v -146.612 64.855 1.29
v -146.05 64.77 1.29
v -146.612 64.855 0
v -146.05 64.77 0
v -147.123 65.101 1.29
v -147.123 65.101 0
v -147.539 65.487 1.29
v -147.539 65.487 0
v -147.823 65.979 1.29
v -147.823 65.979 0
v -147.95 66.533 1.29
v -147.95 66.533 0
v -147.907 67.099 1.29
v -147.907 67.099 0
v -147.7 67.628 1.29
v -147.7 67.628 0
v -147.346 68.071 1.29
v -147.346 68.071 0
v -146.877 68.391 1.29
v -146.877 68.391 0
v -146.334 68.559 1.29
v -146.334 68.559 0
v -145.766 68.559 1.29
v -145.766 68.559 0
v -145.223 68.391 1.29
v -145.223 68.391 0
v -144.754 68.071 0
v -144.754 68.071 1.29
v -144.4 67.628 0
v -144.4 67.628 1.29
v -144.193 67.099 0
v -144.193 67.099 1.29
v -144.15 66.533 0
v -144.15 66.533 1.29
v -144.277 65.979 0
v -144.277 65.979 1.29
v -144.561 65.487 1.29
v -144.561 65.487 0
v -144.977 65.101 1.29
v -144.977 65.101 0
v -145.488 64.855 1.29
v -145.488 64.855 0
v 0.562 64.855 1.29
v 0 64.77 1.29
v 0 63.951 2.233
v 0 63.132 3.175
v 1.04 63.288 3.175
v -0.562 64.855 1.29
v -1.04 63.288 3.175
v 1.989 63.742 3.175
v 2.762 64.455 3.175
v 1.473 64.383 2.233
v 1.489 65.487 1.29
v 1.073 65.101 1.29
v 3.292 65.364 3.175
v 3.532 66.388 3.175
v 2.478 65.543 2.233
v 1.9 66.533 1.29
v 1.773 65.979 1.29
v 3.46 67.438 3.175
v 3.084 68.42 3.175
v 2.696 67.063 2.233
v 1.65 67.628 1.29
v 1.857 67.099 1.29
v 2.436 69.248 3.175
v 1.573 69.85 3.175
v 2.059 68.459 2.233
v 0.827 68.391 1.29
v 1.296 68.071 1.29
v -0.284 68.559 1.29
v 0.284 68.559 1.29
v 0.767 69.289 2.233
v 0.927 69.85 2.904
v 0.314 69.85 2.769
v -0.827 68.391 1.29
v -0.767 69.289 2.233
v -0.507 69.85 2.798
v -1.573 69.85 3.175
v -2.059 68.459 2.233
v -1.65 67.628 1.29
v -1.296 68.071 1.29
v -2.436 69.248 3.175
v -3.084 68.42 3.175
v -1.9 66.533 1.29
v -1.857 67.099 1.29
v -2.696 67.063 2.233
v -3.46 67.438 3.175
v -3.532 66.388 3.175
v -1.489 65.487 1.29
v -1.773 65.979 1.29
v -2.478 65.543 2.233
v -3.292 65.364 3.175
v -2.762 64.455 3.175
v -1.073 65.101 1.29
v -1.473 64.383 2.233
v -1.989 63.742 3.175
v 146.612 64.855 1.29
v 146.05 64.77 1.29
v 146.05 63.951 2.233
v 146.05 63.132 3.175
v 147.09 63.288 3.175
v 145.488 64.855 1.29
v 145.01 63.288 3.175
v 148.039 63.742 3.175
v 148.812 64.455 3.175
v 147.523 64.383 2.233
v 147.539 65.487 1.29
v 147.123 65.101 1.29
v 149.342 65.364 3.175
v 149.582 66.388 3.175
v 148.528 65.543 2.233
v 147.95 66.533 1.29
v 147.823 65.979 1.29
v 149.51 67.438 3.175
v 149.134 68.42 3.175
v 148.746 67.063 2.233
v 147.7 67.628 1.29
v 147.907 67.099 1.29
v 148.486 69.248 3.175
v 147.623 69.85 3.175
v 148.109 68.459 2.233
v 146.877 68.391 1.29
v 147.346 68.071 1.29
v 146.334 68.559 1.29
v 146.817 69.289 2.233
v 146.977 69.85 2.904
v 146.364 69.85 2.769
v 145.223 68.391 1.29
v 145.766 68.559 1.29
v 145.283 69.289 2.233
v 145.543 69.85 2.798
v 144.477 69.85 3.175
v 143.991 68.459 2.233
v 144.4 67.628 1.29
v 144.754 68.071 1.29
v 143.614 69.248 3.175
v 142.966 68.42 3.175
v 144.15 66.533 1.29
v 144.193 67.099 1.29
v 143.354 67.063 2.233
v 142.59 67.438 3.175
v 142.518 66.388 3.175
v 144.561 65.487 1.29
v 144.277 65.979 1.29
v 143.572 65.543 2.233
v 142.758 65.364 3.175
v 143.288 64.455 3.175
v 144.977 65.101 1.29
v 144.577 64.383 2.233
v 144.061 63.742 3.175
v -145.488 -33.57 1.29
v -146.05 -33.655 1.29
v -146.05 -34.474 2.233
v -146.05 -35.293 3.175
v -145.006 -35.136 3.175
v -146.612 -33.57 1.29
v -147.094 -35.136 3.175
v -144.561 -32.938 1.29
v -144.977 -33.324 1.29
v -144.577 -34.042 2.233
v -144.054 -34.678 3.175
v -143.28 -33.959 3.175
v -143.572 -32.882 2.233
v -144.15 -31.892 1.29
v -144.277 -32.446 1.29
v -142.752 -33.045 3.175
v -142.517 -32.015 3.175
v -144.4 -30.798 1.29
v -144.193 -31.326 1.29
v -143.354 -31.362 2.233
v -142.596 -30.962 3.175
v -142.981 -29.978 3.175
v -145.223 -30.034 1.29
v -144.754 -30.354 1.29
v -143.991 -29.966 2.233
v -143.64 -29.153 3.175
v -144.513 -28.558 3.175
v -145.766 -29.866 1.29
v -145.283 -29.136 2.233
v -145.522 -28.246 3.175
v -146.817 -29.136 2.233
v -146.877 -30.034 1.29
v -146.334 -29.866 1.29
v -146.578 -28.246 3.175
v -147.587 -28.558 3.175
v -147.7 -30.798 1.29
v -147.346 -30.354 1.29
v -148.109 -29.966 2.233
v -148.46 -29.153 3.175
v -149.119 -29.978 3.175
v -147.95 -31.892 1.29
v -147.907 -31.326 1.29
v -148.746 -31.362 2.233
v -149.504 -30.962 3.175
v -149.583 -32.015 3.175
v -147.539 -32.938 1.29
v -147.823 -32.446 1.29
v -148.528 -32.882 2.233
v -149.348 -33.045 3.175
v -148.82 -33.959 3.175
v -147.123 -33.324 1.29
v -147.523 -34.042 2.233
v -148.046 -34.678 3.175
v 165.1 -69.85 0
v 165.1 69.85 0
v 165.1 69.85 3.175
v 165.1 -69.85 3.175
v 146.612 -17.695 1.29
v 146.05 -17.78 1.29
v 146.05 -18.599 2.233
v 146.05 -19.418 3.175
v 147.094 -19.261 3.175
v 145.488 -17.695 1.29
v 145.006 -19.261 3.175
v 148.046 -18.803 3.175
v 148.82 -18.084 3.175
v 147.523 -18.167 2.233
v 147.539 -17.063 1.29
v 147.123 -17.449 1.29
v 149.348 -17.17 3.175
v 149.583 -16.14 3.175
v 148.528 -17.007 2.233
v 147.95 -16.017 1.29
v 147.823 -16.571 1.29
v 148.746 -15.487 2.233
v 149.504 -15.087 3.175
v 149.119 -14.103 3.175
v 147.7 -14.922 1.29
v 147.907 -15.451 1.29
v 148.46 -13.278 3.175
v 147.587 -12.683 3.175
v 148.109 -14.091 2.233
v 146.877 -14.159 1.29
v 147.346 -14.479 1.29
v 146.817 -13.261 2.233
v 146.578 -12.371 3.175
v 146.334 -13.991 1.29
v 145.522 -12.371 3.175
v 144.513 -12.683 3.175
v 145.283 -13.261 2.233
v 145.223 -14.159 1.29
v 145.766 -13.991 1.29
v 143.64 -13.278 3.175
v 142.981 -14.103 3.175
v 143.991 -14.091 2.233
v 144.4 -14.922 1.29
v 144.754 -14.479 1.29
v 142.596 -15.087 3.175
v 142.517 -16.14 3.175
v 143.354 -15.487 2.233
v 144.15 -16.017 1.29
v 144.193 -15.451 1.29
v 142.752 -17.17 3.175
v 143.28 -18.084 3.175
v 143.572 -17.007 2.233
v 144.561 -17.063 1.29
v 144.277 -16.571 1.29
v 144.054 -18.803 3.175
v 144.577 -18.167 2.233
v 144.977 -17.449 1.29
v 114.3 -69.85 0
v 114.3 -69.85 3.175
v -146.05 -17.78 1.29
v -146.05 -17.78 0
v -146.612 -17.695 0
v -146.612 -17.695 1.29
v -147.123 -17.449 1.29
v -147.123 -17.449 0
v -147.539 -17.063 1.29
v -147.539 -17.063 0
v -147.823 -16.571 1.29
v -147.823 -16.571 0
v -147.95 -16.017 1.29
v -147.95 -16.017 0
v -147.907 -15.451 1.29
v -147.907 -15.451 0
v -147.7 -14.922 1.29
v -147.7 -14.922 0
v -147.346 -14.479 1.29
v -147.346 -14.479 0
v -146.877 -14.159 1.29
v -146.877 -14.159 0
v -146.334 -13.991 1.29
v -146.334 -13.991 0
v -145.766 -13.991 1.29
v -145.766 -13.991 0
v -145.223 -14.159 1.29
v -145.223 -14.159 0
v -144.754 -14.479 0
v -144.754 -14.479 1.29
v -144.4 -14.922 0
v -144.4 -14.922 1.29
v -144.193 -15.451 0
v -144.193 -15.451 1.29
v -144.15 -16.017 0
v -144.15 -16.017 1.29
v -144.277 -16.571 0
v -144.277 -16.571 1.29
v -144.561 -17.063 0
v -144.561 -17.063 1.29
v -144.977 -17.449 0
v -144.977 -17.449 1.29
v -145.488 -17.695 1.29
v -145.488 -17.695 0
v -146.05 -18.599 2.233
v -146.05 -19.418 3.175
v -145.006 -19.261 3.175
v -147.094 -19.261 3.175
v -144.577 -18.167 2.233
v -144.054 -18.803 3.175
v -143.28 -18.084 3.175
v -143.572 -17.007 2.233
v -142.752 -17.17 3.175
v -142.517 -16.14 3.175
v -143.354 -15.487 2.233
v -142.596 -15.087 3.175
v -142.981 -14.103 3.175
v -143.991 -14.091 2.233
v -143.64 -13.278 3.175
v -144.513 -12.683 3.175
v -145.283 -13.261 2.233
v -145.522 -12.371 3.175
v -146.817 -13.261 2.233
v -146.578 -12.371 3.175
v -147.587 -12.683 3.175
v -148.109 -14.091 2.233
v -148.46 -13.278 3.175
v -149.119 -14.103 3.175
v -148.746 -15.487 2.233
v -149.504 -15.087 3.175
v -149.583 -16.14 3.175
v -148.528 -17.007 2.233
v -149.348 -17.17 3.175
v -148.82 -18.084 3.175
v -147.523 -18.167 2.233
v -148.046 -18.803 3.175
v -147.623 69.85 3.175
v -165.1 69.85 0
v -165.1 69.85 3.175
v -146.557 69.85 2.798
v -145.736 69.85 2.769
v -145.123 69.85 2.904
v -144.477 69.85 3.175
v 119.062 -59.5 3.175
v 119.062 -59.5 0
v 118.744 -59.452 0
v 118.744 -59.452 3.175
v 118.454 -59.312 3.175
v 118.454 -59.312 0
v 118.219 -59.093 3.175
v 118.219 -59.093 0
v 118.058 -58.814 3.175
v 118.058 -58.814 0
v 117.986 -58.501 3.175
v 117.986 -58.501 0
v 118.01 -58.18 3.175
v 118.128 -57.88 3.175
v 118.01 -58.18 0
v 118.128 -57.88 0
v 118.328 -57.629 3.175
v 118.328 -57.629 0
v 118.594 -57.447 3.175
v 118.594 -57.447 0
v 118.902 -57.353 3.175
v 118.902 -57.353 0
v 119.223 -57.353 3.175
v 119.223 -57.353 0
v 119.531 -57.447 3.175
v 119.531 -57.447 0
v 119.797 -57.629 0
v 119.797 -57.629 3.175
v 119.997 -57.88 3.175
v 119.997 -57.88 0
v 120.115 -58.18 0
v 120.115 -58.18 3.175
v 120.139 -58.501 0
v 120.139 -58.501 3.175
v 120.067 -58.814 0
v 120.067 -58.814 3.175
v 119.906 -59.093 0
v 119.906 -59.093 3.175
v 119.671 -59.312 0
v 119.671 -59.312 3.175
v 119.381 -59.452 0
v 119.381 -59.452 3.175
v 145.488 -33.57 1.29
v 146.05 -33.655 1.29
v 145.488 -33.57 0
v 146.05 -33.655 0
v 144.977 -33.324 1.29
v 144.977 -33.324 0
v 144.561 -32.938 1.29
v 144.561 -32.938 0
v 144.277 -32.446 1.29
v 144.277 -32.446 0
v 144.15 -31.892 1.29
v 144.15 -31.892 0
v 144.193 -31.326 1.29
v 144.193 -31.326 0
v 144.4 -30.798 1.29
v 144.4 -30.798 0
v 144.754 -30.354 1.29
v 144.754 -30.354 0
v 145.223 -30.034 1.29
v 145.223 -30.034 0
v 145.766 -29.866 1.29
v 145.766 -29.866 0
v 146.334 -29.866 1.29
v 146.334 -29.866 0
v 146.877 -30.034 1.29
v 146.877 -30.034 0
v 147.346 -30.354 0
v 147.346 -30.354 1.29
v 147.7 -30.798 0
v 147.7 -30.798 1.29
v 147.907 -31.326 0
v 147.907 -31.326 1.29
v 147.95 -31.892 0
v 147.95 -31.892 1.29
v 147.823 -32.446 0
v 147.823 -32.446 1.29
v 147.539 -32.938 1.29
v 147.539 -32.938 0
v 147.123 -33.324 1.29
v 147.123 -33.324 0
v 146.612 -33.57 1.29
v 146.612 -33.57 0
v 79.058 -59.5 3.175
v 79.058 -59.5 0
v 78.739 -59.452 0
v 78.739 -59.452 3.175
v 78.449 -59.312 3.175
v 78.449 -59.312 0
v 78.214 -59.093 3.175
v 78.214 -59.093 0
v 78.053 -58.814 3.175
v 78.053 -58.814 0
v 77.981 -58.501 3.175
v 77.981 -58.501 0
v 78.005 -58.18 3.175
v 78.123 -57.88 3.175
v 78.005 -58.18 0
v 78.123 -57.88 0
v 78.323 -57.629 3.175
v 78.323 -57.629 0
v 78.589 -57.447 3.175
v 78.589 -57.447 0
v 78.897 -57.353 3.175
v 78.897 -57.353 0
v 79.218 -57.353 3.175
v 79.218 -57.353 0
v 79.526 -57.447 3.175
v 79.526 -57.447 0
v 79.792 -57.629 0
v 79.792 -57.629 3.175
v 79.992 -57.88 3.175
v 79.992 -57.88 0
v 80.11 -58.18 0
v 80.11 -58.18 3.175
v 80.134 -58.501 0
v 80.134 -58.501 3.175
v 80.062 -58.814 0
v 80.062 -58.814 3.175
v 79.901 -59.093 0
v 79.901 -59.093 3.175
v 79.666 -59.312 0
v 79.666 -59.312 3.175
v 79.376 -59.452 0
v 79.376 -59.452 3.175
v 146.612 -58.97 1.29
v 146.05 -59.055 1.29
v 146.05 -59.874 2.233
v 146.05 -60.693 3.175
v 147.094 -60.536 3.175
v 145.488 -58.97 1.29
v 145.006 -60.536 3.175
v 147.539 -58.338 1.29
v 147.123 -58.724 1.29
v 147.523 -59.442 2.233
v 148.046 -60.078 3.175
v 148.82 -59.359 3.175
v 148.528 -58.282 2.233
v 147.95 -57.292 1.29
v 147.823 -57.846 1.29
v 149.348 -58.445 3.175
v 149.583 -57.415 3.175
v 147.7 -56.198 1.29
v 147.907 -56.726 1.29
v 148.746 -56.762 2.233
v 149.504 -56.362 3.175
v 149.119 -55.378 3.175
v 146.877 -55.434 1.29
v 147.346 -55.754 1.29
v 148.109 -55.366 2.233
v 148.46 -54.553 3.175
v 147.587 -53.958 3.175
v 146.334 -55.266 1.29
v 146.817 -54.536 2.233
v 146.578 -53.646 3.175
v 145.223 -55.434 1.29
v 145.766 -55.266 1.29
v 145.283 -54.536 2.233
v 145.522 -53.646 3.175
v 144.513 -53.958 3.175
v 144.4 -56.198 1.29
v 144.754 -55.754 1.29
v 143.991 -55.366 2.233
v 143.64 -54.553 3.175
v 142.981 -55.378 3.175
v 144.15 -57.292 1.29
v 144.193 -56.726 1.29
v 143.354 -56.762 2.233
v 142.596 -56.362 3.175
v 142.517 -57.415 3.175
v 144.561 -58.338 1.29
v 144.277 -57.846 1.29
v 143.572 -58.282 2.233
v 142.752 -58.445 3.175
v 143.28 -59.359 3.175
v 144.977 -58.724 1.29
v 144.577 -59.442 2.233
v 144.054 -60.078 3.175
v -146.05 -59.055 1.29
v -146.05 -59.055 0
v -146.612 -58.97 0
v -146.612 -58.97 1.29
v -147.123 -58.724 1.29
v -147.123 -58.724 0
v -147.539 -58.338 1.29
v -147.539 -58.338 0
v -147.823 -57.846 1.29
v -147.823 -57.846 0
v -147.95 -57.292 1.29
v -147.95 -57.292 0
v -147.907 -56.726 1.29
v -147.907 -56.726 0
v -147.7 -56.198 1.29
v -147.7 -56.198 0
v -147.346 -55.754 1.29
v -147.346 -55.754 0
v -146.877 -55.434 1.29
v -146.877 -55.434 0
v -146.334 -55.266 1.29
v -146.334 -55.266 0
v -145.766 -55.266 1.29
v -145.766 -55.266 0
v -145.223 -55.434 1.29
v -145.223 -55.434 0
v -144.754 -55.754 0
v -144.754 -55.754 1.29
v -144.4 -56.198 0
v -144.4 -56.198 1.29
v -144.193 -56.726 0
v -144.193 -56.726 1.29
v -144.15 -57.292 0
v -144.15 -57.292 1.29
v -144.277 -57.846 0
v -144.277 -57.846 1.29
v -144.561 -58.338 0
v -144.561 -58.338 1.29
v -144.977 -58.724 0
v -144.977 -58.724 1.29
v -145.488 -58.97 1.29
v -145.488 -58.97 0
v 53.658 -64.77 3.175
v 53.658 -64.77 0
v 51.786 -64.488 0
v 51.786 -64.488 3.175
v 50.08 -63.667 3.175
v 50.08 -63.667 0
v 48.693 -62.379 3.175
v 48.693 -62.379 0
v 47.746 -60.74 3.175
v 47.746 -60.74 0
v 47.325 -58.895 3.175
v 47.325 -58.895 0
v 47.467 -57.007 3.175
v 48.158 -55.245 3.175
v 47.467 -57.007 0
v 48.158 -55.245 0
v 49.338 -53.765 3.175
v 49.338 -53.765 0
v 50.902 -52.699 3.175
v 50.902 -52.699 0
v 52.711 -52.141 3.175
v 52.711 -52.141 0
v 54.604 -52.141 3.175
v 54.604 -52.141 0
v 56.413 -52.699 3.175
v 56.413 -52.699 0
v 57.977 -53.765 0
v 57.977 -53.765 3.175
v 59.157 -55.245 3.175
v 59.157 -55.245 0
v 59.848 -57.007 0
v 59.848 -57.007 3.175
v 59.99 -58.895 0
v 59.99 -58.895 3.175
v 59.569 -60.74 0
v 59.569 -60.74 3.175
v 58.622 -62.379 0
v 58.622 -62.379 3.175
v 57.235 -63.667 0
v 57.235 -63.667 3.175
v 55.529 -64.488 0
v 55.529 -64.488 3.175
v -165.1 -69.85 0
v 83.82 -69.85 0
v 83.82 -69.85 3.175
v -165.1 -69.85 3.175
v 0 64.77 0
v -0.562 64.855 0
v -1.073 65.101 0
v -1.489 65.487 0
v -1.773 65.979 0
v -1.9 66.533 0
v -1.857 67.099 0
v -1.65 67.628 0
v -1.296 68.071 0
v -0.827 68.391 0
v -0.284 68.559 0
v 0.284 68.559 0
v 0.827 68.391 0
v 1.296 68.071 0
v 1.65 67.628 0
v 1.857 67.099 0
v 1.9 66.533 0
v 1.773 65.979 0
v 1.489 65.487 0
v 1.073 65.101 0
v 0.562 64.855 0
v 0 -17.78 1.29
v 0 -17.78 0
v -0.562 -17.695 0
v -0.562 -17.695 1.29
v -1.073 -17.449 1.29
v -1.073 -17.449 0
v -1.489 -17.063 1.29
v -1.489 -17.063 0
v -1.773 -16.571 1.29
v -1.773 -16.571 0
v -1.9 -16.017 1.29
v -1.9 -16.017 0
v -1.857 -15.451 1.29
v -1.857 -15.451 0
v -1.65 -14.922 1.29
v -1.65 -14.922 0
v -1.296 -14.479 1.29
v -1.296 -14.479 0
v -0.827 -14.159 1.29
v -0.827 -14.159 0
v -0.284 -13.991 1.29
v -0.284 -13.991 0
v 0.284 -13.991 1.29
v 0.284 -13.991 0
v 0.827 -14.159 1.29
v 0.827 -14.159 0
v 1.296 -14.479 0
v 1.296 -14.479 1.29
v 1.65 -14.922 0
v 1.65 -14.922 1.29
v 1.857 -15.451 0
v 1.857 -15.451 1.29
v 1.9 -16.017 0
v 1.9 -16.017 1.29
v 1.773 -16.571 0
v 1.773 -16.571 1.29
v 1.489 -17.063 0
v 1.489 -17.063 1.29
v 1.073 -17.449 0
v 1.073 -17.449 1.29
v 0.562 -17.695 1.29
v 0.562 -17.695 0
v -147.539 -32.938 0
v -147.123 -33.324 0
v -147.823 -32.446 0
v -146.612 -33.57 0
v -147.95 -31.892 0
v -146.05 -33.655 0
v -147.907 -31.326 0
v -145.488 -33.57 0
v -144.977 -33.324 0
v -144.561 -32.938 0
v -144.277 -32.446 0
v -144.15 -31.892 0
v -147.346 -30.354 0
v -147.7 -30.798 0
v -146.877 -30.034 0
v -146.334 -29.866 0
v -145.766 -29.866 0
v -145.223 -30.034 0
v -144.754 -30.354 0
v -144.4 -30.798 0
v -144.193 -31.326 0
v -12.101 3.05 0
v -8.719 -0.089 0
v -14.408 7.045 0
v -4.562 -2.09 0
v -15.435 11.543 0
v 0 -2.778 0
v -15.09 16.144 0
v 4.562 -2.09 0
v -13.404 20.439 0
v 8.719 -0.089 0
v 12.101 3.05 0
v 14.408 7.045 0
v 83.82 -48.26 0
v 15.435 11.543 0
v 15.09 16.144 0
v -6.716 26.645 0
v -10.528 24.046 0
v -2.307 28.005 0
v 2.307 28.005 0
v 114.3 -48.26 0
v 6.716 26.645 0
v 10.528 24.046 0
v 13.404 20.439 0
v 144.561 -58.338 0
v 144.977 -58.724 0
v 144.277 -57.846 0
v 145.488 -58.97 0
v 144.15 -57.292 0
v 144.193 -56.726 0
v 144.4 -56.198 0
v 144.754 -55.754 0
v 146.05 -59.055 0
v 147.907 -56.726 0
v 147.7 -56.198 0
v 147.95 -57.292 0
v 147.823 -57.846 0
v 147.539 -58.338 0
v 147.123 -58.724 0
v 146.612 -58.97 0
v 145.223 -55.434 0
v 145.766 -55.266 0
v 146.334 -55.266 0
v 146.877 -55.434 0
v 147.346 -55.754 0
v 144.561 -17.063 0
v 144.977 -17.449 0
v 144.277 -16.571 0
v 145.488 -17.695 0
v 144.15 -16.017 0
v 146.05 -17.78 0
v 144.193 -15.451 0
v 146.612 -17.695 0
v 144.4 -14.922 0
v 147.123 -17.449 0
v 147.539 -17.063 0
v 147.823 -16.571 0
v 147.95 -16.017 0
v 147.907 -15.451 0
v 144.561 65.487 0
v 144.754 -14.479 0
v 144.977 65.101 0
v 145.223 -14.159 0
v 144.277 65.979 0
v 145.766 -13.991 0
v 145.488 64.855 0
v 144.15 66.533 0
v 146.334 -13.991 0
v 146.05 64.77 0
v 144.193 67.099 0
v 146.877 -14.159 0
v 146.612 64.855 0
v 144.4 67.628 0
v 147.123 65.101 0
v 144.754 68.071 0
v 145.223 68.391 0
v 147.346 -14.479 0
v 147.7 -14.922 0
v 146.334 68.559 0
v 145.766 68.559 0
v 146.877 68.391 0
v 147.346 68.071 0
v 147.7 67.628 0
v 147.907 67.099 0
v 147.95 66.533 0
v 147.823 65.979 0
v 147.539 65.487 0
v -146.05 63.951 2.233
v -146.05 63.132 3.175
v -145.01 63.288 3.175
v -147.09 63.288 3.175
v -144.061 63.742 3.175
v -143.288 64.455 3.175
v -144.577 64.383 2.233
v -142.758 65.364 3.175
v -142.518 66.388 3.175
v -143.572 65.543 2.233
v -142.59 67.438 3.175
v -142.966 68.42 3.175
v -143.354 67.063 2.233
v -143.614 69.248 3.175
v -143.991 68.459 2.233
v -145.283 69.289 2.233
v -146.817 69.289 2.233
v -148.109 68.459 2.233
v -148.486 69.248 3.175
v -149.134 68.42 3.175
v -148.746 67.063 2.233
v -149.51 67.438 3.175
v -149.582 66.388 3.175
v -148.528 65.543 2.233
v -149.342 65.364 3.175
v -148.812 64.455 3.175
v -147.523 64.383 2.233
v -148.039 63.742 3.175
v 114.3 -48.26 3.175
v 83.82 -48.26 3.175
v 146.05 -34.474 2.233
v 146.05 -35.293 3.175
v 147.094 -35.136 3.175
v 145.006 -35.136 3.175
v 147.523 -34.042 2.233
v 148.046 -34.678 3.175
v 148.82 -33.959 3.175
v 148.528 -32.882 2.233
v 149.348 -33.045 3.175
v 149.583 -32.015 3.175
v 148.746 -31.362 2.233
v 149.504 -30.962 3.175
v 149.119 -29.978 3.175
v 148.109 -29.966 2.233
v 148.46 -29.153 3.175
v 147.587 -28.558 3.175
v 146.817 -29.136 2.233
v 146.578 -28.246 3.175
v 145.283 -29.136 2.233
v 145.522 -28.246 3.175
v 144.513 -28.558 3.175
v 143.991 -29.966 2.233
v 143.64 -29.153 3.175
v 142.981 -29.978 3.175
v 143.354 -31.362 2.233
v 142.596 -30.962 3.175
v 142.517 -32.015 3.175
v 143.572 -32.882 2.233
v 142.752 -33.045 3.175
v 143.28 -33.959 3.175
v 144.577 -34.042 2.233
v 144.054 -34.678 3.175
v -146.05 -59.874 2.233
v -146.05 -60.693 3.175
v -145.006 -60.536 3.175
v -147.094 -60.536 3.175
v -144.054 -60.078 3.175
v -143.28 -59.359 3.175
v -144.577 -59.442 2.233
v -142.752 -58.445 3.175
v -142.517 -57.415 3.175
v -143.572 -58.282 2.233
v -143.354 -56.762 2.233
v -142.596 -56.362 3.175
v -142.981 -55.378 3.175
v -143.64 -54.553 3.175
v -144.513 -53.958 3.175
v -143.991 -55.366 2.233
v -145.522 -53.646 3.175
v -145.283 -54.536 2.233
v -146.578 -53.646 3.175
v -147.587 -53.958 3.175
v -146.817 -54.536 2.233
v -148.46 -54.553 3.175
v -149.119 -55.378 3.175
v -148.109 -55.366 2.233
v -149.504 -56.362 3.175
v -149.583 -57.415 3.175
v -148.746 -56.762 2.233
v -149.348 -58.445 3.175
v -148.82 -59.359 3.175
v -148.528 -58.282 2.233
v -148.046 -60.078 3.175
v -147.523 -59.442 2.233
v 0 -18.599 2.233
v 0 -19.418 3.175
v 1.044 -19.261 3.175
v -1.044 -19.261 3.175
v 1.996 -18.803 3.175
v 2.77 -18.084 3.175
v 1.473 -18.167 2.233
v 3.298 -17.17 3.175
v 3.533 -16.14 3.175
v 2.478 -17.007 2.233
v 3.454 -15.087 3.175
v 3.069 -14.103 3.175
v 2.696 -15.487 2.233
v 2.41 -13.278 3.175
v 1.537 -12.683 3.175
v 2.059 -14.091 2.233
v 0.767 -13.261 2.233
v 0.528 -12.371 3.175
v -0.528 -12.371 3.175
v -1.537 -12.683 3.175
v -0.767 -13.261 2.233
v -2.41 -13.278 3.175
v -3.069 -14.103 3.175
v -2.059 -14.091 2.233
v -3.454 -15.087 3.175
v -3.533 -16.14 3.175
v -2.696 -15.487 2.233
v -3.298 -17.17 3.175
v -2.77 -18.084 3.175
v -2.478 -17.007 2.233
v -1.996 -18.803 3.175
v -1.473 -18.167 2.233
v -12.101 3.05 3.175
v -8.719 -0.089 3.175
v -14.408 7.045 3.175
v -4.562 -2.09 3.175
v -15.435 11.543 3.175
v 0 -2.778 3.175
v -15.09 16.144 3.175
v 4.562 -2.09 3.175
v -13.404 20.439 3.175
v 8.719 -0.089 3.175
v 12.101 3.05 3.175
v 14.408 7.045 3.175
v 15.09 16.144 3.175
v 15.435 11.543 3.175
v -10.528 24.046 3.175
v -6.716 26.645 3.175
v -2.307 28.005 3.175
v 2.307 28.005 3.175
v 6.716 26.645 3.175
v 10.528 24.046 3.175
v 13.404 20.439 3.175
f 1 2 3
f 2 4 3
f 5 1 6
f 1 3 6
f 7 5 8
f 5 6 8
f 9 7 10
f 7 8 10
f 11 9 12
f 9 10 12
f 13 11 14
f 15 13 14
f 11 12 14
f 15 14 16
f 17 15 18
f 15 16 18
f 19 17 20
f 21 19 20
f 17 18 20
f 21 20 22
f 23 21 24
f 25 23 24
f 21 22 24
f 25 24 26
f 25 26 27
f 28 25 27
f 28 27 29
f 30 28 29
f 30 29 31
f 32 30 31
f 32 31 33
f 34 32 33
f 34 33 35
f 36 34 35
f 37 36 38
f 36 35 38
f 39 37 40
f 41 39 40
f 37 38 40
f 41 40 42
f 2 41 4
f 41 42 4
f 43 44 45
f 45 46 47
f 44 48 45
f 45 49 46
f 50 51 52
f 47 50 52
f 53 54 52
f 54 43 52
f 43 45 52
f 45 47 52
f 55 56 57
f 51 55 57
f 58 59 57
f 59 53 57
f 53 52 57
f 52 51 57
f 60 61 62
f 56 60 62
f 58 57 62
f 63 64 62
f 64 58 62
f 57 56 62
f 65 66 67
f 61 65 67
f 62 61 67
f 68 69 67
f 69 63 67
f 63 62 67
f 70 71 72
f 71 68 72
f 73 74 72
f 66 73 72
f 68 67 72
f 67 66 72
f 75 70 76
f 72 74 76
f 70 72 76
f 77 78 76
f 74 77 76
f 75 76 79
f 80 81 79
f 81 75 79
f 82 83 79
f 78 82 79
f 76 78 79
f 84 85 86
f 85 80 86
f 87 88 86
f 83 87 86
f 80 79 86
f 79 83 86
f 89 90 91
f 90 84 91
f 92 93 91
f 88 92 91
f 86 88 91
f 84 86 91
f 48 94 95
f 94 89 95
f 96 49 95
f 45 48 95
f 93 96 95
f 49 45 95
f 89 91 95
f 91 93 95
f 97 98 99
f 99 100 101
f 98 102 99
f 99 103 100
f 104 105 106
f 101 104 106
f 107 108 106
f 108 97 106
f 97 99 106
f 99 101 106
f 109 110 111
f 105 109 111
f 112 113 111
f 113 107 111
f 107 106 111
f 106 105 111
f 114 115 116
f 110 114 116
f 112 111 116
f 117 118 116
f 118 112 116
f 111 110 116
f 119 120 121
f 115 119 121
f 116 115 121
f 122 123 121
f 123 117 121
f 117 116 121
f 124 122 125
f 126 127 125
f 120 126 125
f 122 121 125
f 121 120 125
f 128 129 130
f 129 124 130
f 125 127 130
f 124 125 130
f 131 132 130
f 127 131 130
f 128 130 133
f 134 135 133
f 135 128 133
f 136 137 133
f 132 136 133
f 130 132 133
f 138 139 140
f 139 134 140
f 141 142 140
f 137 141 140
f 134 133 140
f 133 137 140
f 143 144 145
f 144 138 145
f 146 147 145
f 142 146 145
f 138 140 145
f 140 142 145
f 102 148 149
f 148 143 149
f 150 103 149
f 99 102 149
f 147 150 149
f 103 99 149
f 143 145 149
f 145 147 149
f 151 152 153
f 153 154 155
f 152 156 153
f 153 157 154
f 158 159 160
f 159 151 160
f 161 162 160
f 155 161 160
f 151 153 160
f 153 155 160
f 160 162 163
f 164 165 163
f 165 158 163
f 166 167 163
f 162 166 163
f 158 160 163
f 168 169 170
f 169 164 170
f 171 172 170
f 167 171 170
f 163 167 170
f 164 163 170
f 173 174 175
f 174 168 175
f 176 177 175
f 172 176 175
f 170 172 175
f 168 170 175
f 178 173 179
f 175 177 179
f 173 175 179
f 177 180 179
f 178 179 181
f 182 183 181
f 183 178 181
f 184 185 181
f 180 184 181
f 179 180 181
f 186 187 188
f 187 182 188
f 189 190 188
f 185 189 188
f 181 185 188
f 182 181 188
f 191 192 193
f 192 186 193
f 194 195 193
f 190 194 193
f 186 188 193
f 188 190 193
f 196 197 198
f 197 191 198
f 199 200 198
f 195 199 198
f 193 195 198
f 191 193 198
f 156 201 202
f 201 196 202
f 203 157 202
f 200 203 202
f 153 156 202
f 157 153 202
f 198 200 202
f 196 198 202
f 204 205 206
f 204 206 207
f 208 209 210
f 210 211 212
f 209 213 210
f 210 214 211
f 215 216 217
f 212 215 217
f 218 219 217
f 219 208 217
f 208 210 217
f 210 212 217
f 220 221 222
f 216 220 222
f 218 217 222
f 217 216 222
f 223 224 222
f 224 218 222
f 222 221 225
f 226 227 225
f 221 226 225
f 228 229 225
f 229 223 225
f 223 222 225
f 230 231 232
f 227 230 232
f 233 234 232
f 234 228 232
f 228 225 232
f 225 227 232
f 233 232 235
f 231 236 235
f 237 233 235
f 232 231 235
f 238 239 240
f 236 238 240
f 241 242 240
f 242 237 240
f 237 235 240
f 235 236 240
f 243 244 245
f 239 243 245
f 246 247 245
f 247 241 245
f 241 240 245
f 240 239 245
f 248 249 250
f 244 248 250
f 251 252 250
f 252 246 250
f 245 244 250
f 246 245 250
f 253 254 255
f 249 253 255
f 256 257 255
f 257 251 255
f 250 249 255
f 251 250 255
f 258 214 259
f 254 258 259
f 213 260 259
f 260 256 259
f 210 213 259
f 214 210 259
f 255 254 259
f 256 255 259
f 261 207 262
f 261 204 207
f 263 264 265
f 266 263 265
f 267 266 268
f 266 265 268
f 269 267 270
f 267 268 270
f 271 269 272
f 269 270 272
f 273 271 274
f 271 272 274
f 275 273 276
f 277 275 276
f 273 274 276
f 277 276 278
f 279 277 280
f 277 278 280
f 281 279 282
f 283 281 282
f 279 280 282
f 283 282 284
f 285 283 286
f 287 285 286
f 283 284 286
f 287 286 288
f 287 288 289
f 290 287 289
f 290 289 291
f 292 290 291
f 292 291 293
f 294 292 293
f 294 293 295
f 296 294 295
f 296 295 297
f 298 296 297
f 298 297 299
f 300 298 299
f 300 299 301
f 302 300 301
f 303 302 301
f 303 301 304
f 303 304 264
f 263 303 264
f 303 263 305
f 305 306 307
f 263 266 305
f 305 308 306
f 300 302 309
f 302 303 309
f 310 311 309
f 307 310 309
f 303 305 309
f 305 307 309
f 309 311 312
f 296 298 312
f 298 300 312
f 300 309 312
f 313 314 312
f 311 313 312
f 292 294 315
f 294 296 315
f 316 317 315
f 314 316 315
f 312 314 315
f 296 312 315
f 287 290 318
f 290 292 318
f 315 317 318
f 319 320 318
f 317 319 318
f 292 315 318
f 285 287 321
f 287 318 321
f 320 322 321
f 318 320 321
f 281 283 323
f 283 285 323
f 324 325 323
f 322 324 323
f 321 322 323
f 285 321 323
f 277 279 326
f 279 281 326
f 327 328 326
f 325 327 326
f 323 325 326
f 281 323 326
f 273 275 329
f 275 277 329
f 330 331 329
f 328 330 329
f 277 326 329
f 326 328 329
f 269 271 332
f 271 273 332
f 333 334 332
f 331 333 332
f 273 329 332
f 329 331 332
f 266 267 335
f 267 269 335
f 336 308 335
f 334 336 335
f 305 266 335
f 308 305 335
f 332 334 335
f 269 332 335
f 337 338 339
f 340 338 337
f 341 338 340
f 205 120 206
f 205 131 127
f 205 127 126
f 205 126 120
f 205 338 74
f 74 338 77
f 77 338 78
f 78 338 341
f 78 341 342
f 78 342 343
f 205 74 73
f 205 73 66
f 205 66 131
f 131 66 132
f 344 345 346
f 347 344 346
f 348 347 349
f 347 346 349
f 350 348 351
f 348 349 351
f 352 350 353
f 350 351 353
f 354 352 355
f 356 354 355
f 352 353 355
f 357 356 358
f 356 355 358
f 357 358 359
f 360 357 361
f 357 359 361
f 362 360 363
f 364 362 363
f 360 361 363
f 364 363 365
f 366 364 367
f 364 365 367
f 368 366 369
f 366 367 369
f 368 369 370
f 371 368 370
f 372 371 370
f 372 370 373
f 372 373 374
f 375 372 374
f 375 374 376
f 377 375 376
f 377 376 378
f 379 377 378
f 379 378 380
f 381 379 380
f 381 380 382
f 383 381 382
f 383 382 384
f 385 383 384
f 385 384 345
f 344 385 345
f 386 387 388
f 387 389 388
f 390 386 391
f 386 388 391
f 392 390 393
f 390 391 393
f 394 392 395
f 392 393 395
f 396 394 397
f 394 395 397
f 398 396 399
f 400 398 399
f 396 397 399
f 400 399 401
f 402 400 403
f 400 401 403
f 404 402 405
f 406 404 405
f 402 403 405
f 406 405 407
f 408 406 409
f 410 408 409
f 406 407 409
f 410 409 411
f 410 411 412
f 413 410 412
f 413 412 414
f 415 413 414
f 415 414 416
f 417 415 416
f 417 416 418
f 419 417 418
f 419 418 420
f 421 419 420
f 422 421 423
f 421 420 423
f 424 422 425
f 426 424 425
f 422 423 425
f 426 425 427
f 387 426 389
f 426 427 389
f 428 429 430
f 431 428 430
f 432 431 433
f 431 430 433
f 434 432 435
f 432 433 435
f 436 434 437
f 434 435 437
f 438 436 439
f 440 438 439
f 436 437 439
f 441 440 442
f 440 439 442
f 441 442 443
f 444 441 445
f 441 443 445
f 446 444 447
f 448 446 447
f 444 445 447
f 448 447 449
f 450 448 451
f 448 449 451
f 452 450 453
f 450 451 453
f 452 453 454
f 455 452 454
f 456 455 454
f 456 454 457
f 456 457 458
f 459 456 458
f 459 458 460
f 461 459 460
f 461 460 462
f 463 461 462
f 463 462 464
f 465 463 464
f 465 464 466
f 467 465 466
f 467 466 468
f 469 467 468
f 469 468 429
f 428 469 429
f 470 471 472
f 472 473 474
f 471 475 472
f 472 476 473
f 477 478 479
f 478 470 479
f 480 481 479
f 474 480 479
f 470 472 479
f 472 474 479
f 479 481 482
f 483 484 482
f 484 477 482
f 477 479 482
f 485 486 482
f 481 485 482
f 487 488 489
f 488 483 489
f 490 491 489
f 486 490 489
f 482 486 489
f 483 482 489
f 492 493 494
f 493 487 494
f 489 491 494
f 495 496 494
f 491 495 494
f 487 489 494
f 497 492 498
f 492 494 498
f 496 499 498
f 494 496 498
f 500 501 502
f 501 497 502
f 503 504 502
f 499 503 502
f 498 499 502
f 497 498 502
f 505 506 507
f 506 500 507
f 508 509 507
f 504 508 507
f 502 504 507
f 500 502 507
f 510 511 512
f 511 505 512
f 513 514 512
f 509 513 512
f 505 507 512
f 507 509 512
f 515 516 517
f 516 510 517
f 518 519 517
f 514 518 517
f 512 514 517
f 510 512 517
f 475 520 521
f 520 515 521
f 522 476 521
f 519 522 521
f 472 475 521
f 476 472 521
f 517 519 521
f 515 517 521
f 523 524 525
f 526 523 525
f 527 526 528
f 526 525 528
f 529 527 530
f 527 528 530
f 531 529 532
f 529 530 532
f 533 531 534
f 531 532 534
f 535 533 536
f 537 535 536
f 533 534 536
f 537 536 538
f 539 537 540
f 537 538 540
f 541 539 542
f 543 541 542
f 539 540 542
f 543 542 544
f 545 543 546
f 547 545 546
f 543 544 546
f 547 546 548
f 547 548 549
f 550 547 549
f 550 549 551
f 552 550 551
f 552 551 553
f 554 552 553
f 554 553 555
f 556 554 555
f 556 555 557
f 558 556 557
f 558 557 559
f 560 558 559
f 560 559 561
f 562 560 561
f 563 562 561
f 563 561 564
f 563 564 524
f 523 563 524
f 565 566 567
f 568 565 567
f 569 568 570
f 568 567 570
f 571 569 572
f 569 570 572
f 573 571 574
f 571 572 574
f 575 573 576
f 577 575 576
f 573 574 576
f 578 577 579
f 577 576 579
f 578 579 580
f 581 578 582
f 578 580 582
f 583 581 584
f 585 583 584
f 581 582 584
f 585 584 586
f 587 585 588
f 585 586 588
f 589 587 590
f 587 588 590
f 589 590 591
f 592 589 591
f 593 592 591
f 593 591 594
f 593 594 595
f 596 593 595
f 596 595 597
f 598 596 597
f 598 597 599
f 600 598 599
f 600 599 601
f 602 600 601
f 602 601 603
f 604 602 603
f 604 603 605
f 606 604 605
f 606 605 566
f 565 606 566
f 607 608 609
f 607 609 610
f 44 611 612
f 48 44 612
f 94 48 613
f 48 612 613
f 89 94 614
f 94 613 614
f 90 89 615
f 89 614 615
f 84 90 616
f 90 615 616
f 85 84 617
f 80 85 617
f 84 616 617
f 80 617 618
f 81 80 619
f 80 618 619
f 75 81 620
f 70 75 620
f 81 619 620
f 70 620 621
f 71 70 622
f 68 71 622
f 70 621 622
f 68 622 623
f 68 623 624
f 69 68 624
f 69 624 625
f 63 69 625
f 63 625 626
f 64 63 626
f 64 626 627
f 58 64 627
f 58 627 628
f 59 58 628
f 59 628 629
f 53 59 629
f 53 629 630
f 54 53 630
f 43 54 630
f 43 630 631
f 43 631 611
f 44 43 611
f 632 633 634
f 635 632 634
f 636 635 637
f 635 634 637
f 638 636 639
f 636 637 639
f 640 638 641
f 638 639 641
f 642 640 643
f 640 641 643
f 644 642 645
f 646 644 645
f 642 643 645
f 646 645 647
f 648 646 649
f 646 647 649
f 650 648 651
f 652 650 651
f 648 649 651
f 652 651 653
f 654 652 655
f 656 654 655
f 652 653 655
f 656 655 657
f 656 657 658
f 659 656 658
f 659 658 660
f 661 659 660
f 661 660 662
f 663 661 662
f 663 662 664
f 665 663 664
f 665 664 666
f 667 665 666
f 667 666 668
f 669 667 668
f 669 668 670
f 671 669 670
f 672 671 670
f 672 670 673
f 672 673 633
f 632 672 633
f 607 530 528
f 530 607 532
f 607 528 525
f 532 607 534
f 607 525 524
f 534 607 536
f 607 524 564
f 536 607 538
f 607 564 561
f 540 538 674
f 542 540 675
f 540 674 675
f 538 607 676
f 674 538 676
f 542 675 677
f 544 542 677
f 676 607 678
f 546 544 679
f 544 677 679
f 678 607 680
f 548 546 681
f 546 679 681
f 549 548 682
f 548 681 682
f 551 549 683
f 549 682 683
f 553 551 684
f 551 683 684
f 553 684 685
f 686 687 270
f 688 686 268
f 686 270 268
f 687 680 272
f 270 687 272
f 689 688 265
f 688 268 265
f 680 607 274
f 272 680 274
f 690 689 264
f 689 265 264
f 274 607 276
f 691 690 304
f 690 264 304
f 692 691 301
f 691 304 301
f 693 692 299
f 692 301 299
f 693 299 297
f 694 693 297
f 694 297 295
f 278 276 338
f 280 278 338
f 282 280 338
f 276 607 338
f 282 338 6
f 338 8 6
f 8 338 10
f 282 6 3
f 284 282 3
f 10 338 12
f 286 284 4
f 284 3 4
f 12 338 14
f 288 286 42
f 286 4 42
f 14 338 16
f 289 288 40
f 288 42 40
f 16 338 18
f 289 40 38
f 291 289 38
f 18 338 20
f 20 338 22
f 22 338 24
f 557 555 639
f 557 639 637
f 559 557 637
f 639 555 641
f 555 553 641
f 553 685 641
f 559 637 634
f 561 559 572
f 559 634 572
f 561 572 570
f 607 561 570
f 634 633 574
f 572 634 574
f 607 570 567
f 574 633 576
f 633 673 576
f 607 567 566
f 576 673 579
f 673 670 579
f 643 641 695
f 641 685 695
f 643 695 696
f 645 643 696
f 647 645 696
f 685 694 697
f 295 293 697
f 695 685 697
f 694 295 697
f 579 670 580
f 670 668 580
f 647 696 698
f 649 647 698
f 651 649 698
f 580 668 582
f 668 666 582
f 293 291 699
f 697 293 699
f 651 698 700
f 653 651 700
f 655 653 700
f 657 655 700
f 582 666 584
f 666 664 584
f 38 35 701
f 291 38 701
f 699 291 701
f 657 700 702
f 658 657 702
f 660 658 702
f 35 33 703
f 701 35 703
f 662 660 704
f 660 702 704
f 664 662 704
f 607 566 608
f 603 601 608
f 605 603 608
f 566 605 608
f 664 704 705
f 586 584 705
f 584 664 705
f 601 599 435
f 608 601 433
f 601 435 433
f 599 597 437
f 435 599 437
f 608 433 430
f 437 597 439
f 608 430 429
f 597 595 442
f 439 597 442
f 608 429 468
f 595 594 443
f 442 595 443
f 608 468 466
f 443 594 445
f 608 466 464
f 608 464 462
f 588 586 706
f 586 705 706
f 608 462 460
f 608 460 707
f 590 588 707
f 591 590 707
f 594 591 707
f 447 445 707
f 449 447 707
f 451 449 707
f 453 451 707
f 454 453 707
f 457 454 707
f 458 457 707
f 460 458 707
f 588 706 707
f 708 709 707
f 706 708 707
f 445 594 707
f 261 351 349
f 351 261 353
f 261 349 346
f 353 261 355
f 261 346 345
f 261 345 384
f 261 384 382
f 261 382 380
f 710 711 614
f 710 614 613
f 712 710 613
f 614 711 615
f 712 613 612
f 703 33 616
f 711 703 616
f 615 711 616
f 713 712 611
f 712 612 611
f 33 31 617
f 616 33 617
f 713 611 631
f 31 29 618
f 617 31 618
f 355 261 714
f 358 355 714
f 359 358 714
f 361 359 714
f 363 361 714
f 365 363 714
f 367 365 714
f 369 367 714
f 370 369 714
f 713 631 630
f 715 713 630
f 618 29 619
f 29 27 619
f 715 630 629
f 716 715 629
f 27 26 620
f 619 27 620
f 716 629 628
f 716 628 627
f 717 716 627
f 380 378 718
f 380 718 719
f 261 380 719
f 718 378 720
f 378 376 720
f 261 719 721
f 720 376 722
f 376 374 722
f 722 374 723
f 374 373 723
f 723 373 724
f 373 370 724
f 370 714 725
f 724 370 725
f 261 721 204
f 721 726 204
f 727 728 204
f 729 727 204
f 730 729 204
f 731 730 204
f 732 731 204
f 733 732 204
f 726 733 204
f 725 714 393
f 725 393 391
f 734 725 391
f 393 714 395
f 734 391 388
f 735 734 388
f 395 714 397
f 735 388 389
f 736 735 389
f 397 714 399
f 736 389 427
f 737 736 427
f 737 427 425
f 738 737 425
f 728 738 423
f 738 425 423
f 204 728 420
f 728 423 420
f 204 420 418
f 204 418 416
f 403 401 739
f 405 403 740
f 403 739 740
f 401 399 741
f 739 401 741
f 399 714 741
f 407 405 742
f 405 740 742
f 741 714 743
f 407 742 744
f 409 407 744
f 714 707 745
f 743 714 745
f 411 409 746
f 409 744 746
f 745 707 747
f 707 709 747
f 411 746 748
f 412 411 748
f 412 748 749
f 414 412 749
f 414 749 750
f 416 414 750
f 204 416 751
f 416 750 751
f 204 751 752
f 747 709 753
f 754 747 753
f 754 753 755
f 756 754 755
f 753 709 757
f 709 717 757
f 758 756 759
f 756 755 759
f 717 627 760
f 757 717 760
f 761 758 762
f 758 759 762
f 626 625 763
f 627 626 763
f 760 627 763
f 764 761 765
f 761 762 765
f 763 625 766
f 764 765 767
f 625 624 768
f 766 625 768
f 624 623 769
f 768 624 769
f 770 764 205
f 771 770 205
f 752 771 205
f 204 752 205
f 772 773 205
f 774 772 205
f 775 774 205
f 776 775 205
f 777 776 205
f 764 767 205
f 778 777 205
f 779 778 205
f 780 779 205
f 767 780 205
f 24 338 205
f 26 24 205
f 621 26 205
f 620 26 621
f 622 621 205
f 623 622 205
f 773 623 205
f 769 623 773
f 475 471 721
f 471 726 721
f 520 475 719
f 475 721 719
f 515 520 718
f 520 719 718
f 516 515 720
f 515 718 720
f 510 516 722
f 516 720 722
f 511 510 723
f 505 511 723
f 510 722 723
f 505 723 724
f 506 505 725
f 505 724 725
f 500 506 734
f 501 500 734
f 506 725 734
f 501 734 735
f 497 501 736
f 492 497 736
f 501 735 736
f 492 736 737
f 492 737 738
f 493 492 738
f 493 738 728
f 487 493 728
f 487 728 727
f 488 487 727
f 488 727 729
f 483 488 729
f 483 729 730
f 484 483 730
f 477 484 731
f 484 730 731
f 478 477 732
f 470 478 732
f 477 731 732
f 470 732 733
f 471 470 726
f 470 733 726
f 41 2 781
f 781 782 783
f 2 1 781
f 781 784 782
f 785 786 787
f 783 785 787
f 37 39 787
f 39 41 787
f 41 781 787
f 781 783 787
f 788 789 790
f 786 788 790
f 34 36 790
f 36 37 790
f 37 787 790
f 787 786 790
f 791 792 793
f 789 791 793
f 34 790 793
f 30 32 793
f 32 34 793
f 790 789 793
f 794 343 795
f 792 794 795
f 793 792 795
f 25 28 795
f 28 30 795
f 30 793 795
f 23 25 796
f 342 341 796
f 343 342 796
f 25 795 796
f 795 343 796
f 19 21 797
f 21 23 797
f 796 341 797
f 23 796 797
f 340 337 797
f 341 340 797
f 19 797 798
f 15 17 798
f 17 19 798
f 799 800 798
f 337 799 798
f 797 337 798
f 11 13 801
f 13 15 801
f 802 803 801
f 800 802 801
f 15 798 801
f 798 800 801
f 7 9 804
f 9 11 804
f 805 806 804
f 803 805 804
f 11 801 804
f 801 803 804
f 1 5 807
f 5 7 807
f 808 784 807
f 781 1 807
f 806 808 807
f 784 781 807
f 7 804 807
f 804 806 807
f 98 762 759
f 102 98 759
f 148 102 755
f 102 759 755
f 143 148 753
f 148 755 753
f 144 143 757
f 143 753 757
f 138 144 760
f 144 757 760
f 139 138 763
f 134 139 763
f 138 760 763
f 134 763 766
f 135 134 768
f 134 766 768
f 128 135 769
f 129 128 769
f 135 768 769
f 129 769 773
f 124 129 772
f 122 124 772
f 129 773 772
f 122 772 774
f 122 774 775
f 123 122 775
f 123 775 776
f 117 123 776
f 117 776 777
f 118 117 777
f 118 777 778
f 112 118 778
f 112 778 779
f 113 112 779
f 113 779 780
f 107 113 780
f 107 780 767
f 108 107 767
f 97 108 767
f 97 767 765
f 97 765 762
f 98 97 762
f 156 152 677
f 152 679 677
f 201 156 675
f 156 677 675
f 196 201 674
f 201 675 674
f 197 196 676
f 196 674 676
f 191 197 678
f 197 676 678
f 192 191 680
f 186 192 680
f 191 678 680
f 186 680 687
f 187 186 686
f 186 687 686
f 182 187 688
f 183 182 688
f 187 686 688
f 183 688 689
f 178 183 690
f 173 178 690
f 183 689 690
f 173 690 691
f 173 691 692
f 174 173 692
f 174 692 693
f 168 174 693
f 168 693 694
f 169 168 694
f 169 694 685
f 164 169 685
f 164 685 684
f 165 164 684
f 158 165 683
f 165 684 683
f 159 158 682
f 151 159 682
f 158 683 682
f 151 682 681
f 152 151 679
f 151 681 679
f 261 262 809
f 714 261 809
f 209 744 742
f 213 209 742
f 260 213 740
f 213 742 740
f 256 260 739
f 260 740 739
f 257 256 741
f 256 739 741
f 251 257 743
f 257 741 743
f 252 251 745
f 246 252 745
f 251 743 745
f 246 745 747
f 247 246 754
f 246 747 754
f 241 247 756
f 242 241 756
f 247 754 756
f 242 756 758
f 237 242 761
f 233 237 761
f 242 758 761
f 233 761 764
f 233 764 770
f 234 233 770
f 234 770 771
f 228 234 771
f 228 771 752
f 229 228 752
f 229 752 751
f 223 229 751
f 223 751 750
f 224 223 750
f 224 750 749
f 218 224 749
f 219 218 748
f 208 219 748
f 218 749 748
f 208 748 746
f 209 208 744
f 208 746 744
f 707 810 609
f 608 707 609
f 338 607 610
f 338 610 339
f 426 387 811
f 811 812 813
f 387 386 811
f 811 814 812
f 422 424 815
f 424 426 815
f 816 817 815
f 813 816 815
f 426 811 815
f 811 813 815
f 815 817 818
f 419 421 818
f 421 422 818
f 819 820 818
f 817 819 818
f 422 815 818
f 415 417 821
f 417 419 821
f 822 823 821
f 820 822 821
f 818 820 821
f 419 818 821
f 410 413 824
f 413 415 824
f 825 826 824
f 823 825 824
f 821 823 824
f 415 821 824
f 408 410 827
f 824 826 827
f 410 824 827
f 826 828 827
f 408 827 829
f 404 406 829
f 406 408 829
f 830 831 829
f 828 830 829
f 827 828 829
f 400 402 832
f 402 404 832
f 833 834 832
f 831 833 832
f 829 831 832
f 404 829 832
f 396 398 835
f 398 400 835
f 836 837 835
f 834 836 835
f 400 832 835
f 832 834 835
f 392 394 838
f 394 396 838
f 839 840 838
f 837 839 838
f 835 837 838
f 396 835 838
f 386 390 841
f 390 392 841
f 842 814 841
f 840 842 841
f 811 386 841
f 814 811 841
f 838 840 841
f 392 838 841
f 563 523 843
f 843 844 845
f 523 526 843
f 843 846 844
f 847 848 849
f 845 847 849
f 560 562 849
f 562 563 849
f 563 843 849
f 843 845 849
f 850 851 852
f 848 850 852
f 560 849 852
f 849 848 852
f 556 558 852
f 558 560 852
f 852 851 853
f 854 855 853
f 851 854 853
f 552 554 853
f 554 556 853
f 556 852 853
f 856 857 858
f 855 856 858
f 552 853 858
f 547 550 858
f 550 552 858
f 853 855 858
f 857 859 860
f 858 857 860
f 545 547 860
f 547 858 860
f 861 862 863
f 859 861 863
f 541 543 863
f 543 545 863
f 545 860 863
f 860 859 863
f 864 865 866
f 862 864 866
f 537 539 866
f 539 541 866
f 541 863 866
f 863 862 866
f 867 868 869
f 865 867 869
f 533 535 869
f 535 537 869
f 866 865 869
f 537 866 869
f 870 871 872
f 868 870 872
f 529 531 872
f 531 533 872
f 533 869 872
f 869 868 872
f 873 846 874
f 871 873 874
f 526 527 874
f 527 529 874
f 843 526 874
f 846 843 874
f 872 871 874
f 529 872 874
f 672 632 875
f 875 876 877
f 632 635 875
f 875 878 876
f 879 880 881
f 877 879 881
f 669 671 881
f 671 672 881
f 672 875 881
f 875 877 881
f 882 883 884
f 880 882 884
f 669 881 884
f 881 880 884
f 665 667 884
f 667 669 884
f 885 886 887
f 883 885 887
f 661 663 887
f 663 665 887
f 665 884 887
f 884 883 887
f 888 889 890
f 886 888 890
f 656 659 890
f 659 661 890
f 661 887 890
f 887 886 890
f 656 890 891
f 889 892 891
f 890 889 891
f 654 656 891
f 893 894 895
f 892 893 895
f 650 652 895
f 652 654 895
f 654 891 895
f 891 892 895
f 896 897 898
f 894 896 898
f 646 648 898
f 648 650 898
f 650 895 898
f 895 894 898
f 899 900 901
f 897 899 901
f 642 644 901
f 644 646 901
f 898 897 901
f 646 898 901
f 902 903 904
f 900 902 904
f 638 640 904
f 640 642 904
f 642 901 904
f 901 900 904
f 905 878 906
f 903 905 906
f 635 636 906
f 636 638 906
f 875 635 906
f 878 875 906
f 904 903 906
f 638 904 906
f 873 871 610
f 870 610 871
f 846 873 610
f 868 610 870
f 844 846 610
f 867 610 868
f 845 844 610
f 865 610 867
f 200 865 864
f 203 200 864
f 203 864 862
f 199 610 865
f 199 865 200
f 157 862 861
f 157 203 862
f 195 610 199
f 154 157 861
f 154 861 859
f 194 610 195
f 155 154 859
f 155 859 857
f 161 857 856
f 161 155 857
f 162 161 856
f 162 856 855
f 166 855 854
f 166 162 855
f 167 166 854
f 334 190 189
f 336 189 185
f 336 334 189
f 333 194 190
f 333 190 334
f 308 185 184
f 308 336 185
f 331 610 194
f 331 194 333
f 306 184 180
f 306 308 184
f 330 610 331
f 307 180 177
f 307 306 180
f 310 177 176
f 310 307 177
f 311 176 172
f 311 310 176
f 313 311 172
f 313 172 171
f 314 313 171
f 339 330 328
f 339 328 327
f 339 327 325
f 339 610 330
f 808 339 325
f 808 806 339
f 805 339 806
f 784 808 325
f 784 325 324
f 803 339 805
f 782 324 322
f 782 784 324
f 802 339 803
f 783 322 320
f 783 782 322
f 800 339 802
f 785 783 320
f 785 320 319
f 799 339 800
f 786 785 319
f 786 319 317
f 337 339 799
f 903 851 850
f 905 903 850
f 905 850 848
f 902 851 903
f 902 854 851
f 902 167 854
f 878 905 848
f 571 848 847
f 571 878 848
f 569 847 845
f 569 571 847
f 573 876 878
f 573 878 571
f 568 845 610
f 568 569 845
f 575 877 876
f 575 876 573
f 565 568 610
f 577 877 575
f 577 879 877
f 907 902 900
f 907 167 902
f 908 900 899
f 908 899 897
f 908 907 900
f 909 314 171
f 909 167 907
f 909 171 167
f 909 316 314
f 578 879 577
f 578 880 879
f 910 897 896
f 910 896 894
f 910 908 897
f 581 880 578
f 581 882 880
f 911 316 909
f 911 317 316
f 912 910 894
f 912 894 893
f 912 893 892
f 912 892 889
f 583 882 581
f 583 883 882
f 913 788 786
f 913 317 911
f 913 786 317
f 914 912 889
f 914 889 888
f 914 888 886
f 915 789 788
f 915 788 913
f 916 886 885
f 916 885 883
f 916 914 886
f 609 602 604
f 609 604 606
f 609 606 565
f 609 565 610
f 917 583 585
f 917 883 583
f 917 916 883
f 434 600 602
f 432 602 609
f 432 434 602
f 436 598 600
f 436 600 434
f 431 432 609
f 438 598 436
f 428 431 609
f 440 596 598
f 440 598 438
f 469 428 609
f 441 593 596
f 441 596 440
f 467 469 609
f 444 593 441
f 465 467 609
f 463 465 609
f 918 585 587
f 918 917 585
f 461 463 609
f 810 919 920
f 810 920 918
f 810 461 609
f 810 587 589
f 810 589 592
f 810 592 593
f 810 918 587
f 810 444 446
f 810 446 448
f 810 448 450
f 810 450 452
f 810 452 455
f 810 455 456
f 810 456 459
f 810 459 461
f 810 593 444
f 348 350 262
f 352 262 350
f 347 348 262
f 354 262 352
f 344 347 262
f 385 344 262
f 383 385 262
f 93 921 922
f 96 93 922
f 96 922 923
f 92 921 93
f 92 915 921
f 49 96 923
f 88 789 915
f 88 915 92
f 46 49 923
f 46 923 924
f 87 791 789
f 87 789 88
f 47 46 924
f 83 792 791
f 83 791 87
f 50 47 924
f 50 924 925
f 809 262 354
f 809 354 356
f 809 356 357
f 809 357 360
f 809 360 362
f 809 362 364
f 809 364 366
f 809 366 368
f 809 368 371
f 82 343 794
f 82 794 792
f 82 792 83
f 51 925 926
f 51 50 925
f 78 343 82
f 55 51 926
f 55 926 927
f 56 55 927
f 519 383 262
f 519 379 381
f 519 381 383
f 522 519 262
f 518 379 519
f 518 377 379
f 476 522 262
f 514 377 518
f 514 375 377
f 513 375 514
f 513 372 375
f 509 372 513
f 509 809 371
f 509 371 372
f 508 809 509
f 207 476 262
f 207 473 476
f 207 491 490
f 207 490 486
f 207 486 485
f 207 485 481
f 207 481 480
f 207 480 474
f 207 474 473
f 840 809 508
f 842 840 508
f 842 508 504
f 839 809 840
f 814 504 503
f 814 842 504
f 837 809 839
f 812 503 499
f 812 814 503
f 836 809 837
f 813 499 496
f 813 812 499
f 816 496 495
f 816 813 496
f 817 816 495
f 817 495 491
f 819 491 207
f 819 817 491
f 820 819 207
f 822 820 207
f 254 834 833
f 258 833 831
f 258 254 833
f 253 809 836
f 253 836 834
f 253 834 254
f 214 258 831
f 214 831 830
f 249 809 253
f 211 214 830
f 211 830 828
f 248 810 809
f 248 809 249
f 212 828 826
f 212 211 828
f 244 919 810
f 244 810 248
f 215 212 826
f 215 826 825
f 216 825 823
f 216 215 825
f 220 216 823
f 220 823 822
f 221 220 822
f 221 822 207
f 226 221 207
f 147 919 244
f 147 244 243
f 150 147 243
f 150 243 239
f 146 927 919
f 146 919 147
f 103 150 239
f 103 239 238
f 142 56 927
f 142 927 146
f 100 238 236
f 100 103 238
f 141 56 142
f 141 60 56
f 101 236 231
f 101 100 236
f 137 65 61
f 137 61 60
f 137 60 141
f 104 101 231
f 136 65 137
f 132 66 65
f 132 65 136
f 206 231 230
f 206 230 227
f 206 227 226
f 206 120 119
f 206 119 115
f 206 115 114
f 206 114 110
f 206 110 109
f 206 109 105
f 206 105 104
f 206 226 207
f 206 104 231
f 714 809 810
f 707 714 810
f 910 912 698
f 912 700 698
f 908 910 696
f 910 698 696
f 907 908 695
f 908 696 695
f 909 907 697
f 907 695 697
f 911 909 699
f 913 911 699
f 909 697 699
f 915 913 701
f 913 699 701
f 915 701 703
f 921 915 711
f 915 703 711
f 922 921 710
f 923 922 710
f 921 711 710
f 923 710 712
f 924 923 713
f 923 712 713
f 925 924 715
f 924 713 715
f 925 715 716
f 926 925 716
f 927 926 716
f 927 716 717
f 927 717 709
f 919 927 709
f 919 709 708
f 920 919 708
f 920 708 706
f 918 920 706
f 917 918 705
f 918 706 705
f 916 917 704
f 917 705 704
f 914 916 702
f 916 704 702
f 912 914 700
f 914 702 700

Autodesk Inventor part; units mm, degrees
ref_plane "YZ Plane" through (0, 0, 0) normal (1, 0, 0) x (0, 1, 0)
ref_plane "XZ Plane" through (0, 0, 0) normal (0, 1, 0) x (-1, 0, 0)
ref_plane "XY Plane" through (0, 0, 0) normal (0, 0, 1) x (1, 0, 0)
sketch "Sketch1" plane through (0, 0, 0) normal (0, 0, 1) x (1, 0, 0)
  line L0 (-165.1, 69.85) -> (165.1, 69.85)
  line L1 (165.1, 69.85) -> (165.1, -69.85)
  line L2 (165.1, -69.85) -> (-165.1, -69.85)
  line L3 (-165.1, -69.85) -> (-165.1, 69.85)
  point P0 (0, 0)
  dimension "d0" = 139.7
  dimension "d1" = 330.2
  dimension "d2" = 69.85
  dimension "d3" = 165.1
extrude "Extrusion1" add sketch "Sketch1" along normal blind 3.175
sketch "Sketch4" plane through (0, 0, 3.175) normal (0, 0, 1) x (1, 0, 0)
  line L0 (-165.1, 69.85) -> (165.1, 69.85) projected
  line L1 (-165.1, -69.85) -> (-165.1, 69.85) projected
  line L2 (165.1, -69.85) -> (-165.1, -69.85) projected
  line L3 (165.1, 69.85) -> (165.1, -69.85) projected
  line L4 (-165.1, -15.875) -> (165.1, -15.875) construction
  line L5 (0, 69.85) -> (0, -69.85) construction
  line L6 (-146.05, 69.85) -> (-146.05, -69.85) construction
  line L7 (-165.1, 66.675) -> (165.1, 66.675) construction
  point P0 (0, 0)
  point P1 (-146.05, -15.875)
  point P2 (146.05, -15.875)
  point P3 (0, -15.875)
  point P4 (-146.05, -31.75)
  point P5 (-146.05, -57.15)
  point P6 (146.05, -31.75)
  point P7 (146.05, -57.15)
  point P8 (0, 66.675)
  point P9 (-146.05, 66.675)
  point P10 (146.05, 66.675)
  dimension "d24" = 85.725
  dimension "d49" = 12.7
  dimension "d50" = 25.4
  dimension "d90" = 3.175
  dimension "d92" = 146.05
hole "Hole3" at (-146.05, -15.875, 3.175) at (146.05, -15.875, 3.175) at (0, -15.875, 3.175) at (-146.05, -31.75, 3.175) at (-146.05, -57.15, 3.175) at (146.05, -31.75, 3.175) at (146.05, -57.15, 3.175) at (-146.05, 66.675, 3.175) at (146.05, 66.675, 3.175) at (0, 66.675, 3.175) direction (0, 0, -1) diameter 3.81 end through all countersink diameter 7.0866 countersink angle 82 clearance for "Flat Head Machine Screw (82)" size "#6" standard "Ansi Unified Screw Threads"
sketch "Sketch7" plane through (0, 0, 3.175) normal (0, 0, 1) x (1, 0, 0)
  line L0 (0, -97.79) -> (0, 97.79) construction
  line L1 (-165.1, 69.85) -> (165.1, 69.85) projected
  point P0 (0, 0)
  point P1 (0, 12.7)
  dimension "d51" = 57.15
hole "Hole5" at (0, 12.7, 3.175) direction (0, 0, -1) diameter 30.9563 end through all
sketch "Sketch8" plane through (0, 0, 3.175) normal (0, 0, 1) x (1, 0, 0)
  line L0 (165.1, -69.85) -> (-165.1, -69.85) projected
  line L1 (83.82, -69.85) -> (114.3, -69.85)
  line L2 (114.3, -69.85) -> (114.3, -48.26)
  line L3 (114.3, -48.26) -> (83.82, -48.26)
  line L4 (83.82, -48.26) -> (83.82, -69.85)
  line L5 (165.1, 69.85) -> (165.1, -69.85) projected
  line L6 (99.06, -48.26) -> (99.06, -69.85) construction
  point P0 (0, 0)
  point P1 (79.0575, -58.42)
  point P2 (119.0625, -58.42)
  point P3 (53.6575, -58.42)
  dimension "d59" = 30.48
  dimension "d60" = 21.59
  dimension "d61" = 50.8
  dimension "d62" = 40.005
  dimension "d63" = 11.43
  dimension "d81" = 25.4
  dimension "d82" = 11.43
extrude "Extrusion3" cut sketch "Sketch8" against normal up to next
hole "Hole6" at (79.0575, -58.42, 3.175) at (119.0625, -58.42, 3.175) direction (0, 0, -1) diameter 2.159 end through all
hole "Hole8" at (53.6575, -58.42, 3.175) direction (0, 0, -1) diameter 12.7 end through all
equation "\"d2\" = 0.5 * d0"
equation "\"d3\" = 0.5 * d1"
equation "\"d82\" = d63"
properties part number "J001400" material "ALUMINUM, 6061-T651"
